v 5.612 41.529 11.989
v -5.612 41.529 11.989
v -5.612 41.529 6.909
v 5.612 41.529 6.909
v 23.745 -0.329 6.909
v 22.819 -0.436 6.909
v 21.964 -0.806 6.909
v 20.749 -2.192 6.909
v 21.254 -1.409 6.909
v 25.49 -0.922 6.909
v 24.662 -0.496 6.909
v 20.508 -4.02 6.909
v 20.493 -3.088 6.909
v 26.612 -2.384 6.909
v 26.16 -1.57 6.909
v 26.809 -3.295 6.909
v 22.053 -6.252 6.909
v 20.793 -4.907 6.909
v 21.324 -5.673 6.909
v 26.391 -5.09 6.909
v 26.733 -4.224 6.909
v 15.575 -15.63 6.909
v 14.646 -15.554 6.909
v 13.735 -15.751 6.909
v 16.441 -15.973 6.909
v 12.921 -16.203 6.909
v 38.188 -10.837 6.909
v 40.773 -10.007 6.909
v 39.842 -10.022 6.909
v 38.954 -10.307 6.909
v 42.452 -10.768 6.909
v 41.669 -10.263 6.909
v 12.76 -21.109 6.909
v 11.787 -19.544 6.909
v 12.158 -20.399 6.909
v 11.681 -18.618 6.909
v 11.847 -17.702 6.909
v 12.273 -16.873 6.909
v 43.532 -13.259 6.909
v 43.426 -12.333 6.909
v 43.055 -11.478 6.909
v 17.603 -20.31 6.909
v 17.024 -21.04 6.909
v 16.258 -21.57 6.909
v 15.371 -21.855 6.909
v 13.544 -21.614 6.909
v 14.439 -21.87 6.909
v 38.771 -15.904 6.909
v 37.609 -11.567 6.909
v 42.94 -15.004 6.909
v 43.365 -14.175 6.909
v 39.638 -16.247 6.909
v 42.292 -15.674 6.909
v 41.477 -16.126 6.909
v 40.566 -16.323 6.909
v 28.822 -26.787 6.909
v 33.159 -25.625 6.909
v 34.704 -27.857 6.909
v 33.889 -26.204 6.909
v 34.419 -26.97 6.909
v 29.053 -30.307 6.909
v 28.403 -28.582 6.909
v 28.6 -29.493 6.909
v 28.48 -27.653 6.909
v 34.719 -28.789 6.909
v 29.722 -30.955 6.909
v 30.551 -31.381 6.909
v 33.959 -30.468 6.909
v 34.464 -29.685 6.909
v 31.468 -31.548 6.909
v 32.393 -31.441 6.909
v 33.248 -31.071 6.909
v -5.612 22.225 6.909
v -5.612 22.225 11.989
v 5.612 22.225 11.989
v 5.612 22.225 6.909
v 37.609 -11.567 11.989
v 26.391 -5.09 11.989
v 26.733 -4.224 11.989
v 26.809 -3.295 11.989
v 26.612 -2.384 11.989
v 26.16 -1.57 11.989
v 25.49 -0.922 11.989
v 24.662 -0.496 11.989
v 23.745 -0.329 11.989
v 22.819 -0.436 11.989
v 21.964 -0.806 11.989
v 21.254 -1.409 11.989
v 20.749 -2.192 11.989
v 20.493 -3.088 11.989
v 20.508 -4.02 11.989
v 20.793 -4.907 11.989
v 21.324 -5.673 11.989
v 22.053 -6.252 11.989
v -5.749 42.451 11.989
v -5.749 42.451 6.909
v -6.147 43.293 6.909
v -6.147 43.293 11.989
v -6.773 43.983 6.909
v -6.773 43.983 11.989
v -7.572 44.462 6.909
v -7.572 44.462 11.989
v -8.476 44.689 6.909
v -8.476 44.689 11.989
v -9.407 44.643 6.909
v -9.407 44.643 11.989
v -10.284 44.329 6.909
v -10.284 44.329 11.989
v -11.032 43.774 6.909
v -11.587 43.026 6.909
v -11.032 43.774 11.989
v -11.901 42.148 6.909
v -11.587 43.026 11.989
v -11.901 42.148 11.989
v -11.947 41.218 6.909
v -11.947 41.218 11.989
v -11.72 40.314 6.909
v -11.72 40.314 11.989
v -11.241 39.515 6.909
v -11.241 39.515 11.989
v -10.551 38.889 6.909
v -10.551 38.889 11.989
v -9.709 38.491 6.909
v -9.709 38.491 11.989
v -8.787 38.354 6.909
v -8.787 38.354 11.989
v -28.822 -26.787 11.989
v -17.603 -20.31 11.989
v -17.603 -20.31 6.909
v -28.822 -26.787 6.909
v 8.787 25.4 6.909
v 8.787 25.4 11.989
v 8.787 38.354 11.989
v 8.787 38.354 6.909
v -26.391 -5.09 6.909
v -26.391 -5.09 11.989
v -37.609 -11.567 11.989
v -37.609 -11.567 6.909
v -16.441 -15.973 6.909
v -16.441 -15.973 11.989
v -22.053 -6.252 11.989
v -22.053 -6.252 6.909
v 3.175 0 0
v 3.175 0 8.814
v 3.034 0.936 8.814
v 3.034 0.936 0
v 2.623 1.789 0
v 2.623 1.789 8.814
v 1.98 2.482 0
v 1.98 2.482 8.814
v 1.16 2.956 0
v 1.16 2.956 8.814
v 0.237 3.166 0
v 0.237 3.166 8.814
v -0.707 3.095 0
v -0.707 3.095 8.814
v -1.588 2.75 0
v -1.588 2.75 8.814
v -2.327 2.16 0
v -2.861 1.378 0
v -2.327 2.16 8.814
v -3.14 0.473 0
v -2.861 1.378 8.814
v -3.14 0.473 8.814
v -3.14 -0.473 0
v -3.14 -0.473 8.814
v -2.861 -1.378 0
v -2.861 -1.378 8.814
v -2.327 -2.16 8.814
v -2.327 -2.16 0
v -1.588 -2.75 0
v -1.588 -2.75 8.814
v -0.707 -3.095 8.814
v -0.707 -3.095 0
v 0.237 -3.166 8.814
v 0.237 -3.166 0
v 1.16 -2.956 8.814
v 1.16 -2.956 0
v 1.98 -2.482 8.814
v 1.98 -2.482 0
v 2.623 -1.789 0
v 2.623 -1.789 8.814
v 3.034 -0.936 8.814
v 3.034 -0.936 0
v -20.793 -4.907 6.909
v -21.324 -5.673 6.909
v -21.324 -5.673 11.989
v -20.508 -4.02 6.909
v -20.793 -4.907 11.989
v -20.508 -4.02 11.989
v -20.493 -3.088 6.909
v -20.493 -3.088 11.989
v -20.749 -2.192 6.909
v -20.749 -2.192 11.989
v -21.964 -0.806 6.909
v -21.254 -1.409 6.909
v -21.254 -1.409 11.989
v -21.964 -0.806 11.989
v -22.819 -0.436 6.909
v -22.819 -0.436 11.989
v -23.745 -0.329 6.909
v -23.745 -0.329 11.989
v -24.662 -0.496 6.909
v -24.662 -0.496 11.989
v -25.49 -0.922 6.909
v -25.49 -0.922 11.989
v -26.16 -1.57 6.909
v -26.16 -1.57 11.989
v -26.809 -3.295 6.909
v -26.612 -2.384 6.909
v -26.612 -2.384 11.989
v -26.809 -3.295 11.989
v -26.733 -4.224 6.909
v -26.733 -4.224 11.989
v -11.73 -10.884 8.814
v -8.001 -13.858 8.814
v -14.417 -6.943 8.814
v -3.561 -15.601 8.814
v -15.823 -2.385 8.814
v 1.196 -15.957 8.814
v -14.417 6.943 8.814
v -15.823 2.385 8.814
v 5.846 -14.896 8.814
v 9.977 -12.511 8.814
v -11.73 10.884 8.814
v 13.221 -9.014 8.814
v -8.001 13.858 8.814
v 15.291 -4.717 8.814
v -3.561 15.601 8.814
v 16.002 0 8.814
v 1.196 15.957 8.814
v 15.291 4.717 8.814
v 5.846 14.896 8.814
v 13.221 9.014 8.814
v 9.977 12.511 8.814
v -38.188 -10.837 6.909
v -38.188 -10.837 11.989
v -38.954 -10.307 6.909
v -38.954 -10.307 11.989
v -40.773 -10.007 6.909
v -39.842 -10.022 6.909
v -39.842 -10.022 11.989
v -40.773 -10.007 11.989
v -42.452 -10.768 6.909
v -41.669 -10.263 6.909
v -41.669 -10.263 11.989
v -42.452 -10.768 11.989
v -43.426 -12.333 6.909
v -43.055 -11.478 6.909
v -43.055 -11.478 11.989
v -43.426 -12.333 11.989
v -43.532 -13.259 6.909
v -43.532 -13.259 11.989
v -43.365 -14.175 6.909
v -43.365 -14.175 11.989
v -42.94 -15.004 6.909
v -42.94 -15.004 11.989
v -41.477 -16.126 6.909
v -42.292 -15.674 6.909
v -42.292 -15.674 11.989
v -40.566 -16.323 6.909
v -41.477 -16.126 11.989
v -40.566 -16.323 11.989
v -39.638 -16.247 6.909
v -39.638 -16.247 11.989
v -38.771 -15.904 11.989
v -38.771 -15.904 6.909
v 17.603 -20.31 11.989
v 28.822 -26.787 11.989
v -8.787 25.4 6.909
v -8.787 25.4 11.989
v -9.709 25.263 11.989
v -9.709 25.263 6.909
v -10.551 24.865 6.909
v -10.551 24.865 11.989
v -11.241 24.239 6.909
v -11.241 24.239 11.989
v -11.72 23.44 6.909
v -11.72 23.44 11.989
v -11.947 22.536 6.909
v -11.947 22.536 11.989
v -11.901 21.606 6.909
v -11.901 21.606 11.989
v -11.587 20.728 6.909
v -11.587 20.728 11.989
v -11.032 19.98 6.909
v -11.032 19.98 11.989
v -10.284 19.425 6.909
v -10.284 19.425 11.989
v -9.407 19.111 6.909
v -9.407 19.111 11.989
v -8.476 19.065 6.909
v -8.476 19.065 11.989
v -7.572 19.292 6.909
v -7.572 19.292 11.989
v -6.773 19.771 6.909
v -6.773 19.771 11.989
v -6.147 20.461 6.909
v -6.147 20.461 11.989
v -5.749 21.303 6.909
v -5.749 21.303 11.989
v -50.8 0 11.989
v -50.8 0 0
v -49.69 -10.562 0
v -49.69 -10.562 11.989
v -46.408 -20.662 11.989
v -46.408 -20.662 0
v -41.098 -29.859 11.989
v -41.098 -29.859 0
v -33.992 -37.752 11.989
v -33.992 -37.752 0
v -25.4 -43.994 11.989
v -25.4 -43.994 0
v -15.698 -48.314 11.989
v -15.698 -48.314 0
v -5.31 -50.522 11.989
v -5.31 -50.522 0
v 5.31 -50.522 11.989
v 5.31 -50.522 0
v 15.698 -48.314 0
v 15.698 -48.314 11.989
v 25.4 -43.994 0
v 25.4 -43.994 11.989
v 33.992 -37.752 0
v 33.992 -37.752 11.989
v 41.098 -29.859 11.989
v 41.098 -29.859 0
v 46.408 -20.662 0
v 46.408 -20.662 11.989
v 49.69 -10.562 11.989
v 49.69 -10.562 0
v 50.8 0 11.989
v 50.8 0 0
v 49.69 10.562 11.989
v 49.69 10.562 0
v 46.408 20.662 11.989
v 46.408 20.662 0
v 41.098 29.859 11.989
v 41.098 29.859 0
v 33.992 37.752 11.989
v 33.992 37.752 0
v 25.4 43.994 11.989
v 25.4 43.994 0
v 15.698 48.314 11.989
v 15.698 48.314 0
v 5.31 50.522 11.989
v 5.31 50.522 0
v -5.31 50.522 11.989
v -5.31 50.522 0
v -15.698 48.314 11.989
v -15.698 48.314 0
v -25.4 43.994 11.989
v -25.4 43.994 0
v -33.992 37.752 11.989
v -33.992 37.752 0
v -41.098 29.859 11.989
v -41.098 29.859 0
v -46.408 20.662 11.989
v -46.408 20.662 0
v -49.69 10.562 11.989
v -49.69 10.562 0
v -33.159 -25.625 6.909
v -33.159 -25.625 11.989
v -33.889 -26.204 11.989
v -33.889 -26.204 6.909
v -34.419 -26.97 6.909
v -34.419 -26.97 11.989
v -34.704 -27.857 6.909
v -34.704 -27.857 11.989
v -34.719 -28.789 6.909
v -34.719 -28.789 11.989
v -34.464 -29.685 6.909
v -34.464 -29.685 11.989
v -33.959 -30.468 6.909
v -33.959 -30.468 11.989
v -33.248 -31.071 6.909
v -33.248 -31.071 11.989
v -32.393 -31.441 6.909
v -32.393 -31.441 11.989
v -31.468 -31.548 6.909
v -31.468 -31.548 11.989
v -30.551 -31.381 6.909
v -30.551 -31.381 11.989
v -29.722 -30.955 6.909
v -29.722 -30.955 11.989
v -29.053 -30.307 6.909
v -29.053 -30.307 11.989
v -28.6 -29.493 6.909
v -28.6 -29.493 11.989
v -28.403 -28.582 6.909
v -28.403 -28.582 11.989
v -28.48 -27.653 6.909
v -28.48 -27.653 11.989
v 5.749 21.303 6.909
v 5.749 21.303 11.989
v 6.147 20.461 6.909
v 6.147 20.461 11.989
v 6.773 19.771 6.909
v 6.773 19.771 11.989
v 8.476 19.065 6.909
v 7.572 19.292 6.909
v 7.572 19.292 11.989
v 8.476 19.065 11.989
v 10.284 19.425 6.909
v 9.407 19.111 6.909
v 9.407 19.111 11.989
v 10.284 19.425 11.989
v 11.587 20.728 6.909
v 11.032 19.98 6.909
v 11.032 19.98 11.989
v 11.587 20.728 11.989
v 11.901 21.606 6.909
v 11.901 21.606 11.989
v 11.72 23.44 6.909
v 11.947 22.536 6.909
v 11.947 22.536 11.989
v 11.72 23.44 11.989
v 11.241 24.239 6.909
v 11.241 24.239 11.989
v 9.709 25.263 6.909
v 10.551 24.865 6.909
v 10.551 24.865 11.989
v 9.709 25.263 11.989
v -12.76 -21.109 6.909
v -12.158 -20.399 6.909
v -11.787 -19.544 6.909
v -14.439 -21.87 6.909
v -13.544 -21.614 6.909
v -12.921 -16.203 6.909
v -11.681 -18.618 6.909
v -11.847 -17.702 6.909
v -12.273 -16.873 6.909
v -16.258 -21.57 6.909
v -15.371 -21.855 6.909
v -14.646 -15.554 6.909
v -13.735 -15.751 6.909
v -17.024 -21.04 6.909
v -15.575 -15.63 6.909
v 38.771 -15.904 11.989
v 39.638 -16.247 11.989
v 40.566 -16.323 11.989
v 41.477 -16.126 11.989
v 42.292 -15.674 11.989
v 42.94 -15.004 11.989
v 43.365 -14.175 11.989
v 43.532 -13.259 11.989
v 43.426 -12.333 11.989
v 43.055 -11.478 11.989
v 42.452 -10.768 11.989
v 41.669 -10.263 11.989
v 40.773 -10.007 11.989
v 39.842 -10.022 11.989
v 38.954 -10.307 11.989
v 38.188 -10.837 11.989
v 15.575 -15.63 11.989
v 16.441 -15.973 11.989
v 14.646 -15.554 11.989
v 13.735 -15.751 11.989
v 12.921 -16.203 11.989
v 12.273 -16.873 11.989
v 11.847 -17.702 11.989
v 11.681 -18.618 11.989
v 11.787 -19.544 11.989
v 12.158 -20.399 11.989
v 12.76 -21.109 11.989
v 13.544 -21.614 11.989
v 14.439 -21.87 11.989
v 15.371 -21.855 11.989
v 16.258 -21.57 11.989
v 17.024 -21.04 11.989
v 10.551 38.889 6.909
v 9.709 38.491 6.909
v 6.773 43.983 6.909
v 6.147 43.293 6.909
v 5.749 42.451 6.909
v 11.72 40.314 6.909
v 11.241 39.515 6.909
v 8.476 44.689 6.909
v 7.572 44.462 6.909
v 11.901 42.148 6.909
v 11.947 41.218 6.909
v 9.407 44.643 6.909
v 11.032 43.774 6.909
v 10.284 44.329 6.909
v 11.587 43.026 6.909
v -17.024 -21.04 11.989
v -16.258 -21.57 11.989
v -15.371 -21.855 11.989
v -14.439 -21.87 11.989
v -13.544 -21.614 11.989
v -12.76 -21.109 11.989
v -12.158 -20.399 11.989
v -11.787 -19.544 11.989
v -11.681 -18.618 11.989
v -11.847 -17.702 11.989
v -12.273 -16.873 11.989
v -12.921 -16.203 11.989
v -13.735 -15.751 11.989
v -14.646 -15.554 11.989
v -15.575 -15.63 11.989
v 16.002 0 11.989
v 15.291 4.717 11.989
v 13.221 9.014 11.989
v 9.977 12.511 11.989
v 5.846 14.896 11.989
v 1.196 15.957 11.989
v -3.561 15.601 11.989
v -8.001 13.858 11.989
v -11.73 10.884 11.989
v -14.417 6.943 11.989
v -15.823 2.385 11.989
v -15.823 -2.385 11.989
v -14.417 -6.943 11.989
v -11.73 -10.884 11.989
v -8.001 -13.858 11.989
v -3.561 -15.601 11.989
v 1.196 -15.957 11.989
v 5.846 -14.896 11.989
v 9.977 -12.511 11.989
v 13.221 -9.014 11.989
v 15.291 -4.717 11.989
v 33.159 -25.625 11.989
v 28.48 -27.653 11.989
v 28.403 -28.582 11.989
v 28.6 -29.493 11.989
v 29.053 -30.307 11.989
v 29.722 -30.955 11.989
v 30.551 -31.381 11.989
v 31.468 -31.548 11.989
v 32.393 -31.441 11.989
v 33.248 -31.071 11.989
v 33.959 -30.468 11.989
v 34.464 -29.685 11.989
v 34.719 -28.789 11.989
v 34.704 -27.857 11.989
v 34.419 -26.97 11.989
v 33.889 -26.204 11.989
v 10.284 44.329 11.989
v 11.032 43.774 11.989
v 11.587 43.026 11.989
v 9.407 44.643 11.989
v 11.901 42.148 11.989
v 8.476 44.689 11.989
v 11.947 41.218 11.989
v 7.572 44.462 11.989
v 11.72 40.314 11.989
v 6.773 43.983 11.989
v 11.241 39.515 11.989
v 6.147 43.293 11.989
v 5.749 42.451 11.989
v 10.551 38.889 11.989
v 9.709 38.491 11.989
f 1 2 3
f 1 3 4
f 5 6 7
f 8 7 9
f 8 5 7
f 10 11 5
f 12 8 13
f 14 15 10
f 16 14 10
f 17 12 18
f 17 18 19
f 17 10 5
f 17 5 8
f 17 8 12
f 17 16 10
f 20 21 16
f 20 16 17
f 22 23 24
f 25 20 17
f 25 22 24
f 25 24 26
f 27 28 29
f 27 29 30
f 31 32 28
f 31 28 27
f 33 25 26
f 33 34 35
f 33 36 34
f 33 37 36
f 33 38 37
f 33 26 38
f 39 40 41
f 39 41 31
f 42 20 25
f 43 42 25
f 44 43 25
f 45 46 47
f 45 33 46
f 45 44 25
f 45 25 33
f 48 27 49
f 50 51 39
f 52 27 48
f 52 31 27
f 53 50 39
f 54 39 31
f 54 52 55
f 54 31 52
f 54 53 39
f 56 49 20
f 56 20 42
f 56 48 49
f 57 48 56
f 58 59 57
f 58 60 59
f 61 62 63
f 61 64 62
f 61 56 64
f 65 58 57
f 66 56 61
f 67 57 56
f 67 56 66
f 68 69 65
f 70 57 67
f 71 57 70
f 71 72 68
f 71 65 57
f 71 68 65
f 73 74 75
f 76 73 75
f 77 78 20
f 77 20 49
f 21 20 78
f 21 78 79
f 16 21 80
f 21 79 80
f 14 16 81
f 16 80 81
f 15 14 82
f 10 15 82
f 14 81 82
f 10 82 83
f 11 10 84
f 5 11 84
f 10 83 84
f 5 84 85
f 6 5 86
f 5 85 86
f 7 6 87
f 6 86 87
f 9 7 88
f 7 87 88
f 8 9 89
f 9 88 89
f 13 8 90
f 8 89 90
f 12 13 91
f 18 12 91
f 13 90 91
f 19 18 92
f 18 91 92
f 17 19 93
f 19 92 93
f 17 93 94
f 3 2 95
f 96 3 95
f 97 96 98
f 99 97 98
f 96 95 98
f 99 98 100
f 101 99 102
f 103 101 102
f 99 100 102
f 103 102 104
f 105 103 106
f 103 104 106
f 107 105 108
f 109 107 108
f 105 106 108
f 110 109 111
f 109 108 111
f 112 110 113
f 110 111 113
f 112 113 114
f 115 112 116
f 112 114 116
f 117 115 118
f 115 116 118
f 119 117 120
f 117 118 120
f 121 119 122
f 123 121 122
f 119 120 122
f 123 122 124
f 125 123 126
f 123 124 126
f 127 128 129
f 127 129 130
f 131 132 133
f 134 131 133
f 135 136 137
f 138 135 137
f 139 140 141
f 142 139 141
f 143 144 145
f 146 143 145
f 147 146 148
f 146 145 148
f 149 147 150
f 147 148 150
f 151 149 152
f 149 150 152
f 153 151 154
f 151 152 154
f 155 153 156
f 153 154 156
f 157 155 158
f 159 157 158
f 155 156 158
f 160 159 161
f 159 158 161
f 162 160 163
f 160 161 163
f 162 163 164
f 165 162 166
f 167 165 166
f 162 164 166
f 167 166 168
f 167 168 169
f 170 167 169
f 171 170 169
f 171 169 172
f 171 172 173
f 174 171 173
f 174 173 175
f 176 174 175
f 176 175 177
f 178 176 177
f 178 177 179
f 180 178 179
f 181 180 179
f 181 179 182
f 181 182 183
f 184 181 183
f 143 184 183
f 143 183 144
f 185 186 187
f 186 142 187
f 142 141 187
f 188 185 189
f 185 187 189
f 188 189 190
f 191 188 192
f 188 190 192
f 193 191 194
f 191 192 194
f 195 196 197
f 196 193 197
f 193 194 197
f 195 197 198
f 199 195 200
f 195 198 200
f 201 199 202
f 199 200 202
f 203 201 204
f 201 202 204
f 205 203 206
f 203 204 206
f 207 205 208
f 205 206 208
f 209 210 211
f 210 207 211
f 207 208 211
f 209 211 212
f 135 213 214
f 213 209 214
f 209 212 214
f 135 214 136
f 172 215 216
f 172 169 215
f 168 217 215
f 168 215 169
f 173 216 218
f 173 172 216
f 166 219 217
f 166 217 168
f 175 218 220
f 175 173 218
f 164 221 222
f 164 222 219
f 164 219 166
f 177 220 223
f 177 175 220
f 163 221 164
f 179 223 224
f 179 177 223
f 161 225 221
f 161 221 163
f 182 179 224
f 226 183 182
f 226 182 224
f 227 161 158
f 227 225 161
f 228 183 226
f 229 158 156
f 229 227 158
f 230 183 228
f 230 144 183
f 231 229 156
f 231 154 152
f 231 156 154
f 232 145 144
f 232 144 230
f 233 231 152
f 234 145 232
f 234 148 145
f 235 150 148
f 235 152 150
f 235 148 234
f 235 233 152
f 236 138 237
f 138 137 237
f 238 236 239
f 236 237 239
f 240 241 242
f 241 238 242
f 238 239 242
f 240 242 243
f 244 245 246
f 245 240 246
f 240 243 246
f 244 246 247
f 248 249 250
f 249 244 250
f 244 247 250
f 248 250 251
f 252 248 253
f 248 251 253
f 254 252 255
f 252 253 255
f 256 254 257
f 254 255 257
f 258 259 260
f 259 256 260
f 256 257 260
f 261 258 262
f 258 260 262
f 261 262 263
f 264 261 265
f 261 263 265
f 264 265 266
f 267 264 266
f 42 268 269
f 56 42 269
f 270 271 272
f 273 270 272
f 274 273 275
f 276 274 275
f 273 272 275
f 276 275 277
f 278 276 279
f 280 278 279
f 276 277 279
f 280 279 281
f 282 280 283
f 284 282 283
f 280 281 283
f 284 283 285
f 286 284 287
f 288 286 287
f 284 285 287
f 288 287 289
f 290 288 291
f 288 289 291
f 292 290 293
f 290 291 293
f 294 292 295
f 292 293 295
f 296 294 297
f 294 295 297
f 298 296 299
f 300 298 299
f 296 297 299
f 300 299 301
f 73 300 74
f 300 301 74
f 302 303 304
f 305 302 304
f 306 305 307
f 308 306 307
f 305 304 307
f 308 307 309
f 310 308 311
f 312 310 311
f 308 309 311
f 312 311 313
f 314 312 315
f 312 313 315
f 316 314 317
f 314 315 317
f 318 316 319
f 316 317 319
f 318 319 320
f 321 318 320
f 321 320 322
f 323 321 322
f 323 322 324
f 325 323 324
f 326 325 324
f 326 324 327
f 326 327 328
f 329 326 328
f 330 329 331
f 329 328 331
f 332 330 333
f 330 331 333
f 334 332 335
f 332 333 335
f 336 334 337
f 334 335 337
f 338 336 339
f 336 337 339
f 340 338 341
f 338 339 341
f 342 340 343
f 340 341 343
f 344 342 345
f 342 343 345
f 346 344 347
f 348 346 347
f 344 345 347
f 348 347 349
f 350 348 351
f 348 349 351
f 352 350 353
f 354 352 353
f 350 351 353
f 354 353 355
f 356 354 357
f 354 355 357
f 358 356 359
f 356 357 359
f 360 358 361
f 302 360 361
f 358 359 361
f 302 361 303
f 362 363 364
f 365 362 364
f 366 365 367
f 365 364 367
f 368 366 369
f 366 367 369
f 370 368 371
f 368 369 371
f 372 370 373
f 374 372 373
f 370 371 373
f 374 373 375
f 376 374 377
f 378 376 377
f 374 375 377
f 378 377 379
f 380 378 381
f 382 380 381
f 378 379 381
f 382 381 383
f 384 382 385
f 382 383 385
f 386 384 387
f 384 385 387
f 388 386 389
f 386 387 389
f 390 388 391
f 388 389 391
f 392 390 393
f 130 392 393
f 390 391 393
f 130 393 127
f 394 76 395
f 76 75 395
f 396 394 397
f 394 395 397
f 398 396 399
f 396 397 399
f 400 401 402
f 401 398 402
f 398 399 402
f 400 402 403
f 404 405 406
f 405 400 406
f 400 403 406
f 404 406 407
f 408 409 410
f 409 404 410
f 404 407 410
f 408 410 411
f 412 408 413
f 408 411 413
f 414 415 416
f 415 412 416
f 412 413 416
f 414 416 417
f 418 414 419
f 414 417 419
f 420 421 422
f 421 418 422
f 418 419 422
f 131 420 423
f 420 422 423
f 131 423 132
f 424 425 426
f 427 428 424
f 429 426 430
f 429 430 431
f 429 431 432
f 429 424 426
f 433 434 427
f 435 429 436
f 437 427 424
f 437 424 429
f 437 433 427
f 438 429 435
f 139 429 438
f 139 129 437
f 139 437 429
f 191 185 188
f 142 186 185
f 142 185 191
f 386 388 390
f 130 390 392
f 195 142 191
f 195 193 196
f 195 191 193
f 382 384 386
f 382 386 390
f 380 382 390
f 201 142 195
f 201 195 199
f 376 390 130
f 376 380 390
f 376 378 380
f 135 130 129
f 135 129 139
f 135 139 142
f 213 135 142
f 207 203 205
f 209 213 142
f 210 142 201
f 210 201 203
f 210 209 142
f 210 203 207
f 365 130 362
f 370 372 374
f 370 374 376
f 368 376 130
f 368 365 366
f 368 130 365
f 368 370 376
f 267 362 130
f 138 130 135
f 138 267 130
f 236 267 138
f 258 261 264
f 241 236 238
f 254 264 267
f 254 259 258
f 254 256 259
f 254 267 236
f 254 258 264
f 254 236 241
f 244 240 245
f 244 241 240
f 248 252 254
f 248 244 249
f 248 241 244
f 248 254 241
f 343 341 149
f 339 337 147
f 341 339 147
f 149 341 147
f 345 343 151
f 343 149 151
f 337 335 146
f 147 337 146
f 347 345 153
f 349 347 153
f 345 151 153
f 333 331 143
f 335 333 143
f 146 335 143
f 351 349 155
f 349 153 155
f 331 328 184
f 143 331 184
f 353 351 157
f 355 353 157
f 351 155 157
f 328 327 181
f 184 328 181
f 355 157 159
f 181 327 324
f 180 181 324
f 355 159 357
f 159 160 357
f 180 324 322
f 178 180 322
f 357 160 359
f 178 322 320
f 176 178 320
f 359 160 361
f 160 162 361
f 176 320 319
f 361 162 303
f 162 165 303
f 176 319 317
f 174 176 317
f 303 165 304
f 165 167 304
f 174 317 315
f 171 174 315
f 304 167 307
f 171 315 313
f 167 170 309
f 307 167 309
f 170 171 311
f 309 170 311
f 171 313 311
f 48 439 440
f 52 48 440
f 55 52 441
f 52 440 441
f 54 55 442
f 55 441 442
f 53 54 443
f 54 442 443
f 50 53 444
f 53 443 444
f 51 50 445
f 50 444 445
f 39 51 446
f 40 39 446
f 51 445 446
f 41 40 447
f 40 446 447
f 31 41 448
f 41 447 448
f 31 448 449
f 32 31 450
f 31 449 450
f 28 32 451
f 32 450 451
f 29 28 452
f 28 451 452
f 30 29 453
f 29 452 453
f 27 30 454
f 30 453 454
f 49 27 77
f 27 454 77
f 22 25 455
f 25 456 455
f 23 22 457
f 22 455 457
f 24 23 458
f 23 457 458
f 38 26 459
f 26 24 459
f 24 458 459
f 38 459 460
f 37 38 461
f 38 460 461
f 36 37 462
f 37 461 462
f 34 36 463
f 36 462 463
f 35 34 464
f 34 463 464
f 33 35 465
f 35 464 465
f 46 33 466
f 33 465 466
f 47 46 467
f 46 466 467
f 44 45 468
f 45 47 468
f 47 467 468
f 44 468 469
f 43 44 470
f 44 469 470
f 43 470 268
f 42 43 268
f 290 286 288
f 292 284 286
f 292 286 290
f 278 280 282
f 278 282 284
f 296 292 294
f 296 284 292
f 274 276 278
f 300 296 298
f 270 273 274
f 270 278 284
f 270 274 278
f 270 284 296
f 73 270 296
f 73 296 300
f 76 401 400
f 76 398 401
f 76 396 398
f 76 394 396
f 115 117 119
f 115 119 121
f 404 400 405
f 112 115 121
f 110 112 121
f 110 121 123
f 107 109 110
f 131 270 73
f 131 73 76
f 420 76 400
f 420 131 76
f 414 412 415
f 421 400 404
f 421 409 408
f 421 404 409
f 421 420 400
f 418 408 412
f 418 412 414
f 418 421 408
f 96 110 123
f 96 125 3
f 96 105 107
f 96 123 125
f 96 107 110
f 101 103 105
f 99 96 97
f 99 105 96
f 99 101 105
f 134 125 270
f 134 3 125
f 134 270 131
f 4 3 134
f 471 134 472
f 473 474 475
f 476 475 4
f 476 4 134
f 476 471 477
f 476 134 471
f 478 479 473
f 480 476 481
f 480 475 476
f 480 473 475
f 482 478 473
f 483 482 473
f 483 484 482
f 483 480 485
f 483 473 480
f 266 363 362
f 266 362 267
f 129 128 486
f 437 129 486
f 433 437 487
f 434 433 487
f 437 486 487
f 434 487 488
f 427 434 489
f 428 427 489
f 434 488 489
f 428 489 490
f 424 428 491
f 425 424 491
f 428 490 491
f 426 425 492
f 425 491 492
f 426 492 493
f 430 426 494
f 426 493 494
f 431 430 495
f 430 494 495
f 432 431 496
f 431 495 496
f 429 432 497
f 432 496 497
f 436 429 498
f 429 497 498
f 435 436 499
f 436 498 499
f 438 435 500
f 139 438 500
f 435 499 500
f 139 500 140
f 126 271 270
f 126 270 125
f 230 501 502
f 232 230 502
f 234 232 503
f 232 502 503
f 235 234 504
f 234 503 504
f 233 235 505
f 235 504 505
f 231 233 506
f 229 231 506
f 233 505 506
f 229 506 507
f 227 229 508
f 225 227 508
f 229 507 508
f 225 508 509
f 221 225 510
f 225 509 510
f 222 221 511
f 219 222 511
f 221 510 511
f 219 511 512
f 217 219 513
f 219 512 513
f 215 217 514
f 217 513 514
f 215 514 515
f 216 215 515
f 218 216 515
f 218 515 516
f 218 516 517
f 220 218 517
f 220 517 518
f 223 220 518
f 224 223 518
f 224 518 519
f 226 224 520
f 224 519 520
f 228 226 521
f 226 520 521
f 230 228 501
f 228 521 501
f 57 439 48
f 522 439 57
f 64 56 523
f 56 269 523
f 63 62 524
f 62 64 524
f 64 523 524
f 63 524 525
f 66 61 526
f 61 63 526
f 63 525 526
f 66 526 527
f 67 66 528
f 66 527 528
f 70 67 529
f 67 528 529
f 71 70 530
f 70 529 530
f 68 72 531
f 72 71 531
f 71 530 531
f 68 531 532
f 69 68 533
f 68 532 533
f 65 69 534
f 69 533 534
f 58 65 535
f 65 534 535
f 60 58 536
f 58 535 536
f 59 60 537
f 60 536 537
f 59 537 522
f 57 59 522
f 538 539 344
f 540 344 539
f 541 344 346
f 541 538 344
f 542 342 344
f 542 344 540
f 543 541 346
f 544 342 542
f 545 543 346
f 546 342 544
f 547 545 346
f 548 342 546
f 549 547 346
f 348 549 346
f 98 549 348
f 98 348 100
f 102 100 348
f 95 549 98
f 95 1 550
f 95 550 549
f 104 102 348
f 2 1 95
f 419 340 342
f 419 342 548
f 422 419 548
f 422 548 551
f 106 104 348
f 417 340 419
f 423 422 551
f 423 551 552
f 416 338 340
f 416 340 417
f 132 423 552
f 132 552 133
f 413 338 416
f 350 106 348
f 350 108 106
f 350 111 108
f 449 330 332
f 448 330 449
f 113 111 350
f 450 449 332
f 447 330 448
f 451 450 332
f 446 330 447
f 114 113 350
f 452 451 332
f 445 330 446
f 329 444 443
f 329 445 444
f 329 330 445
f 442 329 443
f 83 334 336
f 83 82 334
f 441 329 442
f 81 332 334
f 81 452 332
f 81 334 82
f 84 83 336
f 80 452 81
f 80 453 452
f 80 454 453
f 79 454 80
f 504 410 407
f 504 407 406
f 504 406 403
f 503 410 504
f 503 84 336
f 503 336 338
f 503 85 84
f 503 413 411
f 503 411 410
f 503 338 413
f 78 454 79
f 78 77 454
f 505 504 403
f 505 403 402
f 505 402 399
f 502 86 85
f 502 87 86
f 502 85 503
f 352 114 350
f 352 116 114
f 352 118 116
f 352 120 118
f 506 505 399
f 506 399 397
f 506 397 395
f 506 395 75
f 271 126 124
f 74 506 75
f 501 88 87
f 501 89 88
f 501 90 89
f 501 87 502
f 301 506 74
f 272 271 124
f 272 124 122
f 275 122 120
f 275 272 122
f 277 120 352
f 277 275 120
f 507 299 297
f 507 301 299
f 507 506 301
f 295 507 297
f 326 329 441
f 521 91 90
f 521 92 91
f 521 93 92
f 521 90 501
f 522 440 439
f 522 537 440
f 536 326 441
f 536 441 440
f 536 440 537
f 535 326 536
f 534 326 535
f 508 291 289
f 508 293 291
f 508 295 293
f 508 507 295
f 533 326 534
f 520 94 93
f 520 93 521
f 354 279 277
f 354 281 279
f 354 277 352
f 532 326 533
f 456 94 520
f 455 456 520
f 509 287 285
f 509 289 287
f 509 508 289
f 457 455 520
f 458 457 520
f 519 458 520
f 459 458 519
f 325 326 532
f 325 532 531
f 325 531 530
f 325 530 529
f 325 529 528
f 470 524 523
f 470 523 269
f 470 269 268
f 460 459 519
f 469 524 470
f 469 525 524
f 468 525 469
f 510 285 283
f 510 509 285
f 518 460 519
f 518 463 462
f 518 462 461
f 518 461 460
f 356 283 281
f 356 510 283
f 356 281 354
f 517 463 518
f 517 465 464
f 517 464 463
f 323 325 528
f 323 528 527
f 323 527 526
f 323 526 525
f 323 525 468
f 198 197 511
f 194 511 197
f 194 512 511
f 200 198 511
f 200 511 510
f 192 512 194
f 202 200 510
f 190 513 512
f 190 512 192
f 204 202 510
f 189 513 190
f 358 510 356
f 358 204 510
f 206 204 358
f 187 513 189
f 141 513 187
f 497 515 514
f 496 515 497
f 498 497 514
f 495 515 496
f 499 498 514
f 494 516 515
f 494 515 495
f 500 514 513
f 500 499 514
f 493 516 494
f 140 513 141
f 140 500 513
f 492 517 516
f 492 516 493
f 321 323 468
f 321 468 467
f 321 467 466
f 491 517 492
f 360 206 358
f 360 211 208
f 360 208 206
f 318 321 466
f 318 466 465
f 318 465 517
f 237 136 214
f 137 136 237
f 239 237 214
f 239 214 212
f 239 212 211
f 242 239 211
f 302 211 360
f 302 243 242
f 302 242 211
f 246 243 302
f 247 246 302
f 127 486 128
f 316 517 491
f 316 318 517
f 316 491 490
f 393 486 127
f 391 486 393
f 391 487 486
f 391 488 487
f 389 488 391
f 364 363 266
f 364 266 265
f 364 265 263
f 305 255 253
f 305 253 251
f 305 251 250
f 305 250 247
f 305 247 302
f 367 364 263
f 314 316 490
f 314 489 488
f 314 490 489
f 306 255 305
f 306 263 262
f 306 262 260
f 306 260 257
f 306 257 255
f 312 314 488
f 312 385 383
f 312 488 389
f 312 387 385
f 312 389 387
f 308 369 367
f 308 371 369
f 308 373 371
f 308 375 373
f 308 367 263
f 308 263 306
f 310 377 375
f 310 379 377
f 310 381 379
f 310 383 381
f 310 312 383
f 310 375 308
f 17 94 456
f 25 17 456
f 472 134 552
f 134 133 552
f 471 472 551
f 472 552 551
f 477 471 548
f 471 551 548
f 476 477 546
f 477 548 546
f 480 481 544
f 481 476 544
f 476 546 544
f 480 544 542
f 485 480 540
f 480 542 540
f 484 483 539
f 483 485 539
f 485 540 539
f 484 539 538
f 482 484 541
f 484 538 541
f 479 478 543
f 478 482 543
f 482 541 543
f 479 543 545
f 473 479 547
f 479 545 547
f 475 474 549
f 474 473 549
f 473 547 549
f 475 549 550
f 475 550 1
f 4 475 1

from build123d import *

# Parameters (mm, degrees)
SKETCH1_R            = 50.8
BOSS_EXTRUDE1_DEPTH  = 11.9888
SKETCH3_W            = 17.57426
SKETCH3_H            = 19.304
CUT_EXTRUDE1_DEPTH   = 5.08
SKETCH7_R            = 3.175
CORNER_RELIEFS_DEPTH = 5.08
CIRPATTERN1_COUNT    = 3
SKETCH5_R            = 16.002
MAGNET_INSET_DEPTH   = 3.175
SKETCH6_R            = 3.175
CENTRAL_HOLE_DEPTH   = 73.380681611


with BuildPart() as part:
    # Sketch1 → Boss-Extrude1 (new body)
    with BuildSketch(Plane.XY):
        with Locations(Location((0, 0, 0), (0, 0, 180))):
            Circle(SKETCH1_R)
    extrude(amount=BOSS_EXTRUDE1_DEPTH)

    # Sketch3 → Cut-Extrude1 (cut)
    with BuildSketch(Plane.XY.offset(11.9888)):
        with Locations((0, 31.877)):
            Rectangle(SKETCH3_W, SKETCH3_H)
    cut_extrude1 = extrude(amount=-CUT_EXTRUDE1_DEPTH, mode=Mode.SUBTRACT)

    # Sketch7 → corner reliefs (cut)
    with BuildSketch(Plane.XY.offset(11.9888)):
        with Locations((-8.78713, 41.529)):
            Circle(SKETCH7_R)
        with Locations((-8.78713, 22.225)):
            Circle(SKETCH7_R)
        with Locations((8.78713, 22.225)):
            Circle(SKETCH7_R)
        with Locations((8.78713, 41.529)):
            Circle(SKETCH7_R)
    corner_reliefs = extrude(amount=-CORNER_RELIEFS_DEPTH, mode=Mode.SUBTRACT)

    # CirPattern1: Cut-Extrude1, corner reliefs ×3 about axis
    cirpattern1_axis = Axis((0, 0, 0), (0, 0, 1))
    add([cut_extrude1.rotate(cirpattern1_axis, i * 360 / CIRPATTERN1_COUNT) for i in range(1, CIRPATTERN1_COUNT)], mode=Mode.SUBTRACT)
    add([corner_reliefs.rotate(cirpattern1_axis, i * 360 / CIRPATTERN1_COUNT) for i in range(1, CIRPATTERN1_COUNT)], mode=Mode.SUBTRACT)

    # Sketch5 → magnet inset (cut)
    with BuildSketch(Plane.XY.offset(11.9888)):
        Circle(SKETCH5_R)
    extrude(amount=-MAGNET_INSET_DEPTH, mode=Mode.SUBTRACT)

    # Sketch6 → central hole (cut, through all)
    with BuildSketch(Plane.XY.offset(8.8138)):
        Circle(SKETCH6_R)
    extrude(amount=-CENTRAL_HOLE_DEPTH, mode=Mode.SUBTRACT)


solid = part.part
